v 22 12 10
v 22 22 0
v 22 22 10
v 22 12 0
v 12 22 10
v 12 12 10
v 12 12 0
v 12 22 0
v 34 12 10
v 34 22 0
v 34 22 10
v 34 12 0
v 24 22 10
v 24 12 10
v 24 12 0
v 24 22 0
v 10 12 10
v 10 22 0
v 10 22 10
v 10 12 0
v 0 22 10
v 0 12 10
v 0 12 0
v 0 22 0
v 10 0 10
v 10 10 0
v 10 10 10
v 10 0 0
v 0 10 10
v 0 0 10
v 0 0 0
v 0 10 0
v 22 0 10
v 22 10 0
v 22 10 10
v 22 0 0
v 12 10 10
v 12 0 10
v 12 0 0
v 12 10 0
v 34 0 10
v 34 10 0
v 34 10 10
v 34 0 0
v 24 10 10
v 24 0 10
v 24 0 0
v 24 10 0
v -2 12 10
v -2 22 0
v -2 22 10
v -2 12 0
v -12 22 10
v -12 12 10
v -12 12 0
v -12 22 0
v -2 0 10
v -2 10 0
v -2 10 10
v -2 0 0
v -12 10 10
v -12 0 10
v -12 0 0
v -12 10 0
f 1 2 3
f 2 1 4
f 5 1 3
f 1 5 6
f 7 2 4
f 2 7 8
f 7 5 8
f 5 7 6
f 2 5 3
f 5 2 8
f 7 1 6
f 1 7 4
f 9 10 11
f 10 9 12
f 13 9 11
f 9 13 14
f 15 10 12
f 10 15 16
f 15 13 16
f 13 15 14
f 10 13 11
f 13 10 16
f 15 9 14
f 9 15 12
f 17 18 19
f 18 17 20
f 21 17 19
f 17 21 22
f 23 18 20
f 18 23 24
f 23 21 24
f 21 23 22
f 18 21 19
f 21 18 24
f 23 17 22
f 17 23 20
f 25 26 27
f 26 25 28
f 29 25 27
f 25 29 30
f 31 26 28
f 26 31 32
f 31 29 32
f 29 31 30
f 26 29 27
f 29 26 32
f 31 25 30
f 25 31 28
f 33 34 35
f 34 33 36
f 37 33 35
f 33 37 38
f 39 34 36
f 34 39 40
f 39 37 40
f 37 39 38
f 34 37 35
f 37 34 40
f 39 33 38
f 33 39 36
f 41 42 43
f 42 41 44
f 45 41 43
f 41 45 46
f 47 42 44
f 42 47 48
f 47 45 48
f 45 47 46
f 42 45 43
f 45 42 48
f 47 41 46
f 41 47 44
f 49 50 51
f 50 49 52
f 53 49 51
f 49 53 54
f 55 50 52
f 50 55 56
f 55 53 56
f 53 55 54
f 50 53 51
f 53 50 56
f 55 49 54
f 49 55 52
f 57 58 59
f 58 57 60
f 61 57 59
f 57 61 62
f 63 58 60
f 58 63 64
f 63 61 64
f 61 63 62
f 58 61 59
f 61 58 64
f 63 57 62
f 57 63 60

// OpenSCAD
module object() cube([10,10,10]);

translate([12,12,0]) object();
color([1,0,0]) translate([24,12,0]) object();
translate([0,12,0]) color([0,1,1]) object();
color([0,0,1,0.5]) object();
translate([12,0,0]) color([0,0,1],0.5) object();
translate([24,0,0]) color(c="Green",alpha=0.2) object();
translate([-12,12,0]) color() object();
translate([-12,0,0]) color(alpha=0.5) object();
